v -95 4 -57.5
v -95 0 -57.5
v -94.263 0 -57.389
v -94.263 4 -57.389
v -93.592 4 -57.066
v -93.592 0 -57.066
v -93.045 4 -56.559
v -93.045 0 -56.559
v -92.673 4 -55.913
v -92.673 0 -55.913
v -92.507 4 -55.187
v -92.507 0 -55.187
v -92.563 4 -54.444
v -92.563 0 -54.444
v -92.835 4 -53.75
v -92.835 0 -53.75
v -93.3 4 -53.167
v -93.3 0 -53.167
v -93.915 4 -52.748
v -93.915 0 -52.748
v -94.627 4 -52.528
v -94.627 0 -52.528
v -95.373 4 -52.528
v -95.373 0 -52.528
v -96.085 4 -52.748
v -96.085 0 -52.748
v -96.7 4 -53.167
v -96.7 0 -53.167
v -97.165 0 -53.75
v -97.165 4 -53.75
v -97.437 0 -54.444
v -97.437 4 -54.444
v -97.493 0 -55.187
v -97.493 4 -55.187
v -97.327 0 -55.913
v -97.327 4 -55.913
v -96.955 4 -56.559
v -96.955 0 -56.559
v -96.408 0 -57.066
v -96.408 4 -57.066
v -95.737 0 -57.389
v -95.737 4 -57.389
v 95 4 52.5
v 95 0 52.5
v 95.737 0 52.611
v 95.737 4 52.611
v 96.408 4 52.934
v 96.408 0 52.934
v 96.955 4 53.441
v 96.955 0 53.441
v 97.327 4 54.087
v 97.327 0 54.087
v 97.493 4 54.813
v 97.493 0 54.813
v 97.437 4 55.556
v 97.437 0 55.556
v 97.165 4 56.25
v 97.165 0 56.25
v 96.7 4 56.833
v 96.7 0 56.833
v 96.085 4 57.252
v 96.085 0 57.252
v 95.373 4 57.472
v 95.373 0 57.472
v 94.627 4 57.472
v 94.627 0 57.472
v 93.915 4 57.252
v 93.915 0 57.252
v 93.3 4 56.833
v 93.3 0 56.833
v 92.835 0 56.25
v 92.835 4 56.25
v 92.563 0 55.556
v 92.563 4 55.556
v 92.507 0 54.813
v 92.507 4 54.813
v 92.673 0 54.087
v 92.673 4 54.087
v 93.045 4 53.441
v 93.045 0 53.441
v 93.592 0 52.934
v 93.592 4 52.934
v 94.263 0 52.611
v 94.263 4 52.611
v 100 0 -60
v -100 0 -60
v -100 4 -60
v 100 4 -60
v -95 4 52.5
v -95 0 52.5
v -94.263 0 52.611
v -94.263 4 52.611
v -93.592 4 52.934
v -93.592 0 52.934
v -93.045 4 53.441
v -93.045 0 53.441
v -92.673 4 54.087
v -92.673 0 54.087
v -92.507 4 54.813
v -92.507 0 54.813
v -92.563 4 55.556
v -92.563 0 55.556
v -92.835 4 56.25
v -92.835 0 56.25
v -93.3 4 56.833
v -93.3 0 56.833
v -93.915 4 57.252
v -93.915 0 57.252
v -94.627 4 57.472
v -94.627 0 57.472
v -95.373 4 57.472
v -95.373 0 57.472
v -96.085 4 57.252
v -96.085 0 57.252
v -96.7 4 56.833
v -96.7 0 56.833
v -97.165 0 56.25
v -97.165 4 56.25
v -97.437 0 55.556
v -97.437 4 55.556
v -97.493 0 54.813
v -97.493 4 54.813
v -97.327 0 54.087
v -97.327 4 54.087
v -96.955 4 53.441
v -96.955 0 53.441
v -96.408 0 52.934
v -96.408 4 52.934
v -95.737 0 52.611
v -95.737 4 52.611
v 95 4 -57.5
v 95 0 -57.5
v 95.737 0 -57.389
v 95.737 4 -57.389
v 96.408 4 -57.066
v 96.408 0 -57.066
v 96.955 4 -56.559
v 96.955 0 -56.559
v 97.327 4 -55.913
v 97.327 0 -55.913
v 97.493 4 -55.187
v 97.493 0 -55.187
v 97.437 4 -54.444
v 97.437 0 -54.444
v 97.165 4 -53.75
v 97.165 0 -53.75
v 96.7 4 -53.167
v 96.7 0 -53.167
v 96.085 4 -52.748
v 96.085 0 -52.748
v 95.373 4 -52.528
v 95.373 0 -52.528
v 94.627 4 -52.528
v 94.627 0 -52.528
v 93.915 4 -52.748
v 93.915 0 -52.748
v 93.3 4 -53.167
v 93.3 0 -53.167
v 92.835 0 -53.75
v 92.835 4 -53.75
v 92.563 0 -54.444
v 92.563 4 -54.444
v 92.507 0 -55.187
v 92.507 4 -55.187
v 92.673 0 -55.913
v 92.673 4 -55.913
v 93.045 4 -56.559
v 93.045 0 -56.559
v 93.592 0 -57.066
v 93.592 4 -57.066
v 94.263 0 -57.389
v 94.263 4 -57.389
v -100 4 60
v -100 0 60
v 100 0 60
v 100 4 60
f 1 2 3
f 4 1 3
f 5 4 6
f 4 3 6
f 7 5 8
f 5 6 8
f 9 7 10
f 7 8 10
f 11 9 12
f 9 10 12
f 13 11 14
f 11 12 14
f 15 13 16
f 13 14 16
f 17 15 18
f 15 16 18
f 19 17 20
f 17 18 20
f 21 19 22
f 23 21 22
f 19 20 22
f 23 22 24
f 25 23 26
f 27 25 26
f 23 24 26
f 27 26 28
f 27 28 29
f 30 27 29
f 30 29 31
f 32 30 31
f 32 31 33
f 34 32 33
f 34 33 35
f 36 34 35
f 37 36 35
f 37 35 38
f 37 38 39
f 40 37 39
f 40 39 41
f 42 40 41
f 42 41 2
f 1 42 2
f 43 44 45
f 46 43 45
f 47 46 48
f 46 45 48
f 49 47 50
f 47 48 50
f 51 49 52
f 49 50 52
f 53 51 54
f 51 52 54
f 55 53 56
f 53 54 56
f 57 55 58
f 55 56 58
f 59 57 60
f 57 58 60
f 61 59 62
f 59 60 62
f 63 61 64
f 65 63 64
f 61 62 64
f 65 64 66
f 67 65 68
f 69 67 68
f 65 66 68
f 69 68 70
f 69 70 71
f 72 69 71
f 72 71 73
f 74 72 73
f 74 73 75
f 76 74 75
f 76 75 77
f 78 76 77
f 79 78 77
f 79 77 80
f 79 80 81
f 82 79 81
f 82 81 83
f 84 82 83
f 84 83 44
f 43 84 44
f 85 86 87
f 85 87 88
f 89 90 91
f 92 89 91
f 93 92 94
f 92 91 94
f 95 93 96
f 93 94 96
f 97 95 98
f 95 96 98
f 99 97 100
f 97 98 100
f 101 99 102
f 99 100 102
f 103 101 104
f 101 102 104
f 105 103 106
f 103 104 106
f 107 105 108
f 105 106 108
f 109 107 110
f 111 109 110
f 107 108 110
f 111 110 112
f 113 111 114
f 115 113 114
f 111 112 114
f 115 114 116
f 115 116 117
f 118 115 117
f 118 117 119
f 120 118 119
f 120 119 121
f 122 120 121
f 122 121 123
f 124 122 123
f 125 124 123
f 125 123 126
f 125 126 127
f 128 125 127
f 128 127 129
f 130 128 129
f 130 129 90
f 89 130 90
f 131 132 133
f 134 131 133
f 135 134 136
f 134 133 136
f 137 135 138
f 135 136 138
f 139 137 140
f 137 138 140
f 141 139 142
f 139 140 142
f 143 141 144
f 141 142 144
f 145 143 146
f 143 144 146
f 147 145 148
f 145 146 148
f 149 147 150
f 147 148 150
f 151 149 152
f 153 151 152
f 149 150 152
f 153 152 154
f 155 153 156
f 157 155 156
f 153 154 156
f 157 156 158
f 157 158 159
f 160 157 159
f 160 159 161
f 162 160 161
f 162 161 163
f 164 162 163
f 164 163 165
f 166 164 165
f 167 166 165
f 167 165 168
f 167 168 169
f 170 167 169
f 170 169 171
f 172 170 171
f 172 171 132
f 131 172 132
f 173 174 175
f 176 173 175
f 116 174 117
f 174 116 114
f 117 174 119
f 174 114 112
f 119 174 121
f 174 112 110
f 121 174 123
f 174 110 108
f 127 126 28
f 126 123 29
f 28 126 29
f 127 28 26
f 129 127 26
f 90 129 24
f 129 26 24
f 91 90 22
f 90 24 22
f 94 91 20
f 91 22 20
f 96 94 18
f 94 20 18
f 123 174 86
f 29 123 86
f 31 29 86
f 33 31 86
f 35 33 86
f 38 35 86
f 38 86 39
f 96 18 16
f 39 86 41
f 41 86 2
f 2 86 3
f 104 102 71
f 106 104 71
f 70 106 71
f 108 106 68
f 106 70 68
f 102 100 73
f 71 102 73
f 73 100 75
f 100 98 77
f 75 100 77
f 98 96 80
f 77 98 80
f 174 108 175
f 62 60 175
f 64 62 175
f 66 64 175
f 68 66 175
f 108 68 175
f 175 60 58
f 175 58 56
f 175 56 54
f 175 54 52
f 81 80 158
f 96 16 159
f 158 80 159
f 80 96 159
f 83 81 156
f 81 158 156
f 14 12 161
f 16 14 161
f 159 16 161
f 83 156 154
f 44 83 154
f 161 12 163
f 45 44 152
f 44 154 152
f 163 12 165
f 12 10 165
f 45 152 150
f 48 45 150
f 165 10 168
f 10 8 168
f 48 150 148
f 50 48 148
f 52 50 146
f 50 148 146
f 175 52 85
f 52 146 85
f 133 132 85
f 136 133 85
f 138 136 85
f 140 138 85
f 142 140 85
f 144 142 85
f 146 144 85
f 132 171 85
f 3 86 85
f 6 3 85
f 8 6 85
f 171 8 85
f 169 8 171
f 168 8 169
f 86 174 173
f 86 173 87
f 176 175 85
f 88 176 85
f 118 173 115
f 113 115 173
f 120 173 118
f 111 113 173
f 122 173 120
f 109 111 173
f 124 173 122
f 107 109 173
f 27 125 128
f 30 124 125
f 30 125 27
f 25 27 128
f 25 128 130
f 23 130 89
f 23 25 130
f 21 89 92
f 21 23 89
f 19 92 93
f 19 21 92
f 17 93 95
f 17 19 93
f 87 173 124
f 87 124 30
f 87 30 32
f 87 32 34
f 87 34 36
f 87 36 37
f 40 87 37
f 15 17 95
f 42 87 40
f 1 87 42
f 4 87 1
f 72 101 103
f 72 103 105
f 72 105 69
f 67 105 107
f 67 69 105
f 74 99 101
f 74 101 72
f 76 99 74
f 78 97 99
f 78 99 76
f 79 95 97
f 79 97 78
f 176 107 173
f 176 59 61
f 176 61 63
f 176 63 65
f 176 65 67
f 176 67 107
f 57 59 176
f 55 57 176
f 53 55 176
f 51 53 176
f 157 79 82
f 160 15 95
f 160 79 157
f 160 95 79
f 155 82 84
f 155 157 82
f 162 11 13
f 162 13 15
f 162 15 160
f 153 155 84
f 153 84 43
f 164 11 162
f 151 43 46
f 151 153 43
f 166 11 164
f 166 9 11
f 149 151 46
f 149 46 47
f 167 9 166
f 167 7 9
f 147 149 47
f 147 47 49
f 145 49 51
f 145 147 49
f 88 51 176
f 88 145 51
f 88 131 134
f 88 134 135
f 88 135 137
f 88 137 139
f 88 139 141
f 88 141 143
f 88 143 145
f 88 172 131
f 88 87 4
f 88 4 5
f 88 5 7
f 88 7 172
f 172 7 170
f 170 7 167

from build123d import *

# Parameters (mm, degrees)
SKETCH2_W                 = 200
SKETCH2_H                 = 120
BOSS_EXTRUDE1_DEPTH       = 4
F_3_0MM_DOWEL_HOLE1_D     = 5
F_3_0MM_DOWEL_HOLE1_DEPTH = 20
F_3_0MM_DOWEL_HOLE1_TIP   = 1.502151548


with BuildPart() as part:
    # Sketch2 → Boss-Extrude1 (new body)
    with BuildSketch(Plane(origin=(0, 0, 0), x_dir=(1, 0, 0), z_dir=(0, 1, 0))):
        Rectangle(SKETCH2_W, SKETCH2_H)
    extrude(amount=BOSS_EXTRUDE1_DEPTH)

    # Ø3.0mm Dowel Hole1
    with Locations(Plane(origin=(-95, 4, -55), x_dir=(0, 0, 1), z_dir=(0, 1, 0))):
        with Locations((0, 0), (110, 0), (110, 190), (0, 190)):
            Hole(F_3_0MM_DOWEL_HOLE1_D / 2, depth=F_3_0MM_DOWEL_HOLE1_DEPTH)
            with Locations((0, 0, -(F_3_0MM_DOWEL_HOLE1_DEPTH + F_3_0MM_DOWEL_HOLE1_TIP / 2))):  # 118° drill point
                Cone(0, F_3_0MM_DOWEL_HOLE1_D / 2, F_3_0MM_DOWEL_HOLE1_TIP, mode=Mode.SUBTRACT)


solid = part.part
